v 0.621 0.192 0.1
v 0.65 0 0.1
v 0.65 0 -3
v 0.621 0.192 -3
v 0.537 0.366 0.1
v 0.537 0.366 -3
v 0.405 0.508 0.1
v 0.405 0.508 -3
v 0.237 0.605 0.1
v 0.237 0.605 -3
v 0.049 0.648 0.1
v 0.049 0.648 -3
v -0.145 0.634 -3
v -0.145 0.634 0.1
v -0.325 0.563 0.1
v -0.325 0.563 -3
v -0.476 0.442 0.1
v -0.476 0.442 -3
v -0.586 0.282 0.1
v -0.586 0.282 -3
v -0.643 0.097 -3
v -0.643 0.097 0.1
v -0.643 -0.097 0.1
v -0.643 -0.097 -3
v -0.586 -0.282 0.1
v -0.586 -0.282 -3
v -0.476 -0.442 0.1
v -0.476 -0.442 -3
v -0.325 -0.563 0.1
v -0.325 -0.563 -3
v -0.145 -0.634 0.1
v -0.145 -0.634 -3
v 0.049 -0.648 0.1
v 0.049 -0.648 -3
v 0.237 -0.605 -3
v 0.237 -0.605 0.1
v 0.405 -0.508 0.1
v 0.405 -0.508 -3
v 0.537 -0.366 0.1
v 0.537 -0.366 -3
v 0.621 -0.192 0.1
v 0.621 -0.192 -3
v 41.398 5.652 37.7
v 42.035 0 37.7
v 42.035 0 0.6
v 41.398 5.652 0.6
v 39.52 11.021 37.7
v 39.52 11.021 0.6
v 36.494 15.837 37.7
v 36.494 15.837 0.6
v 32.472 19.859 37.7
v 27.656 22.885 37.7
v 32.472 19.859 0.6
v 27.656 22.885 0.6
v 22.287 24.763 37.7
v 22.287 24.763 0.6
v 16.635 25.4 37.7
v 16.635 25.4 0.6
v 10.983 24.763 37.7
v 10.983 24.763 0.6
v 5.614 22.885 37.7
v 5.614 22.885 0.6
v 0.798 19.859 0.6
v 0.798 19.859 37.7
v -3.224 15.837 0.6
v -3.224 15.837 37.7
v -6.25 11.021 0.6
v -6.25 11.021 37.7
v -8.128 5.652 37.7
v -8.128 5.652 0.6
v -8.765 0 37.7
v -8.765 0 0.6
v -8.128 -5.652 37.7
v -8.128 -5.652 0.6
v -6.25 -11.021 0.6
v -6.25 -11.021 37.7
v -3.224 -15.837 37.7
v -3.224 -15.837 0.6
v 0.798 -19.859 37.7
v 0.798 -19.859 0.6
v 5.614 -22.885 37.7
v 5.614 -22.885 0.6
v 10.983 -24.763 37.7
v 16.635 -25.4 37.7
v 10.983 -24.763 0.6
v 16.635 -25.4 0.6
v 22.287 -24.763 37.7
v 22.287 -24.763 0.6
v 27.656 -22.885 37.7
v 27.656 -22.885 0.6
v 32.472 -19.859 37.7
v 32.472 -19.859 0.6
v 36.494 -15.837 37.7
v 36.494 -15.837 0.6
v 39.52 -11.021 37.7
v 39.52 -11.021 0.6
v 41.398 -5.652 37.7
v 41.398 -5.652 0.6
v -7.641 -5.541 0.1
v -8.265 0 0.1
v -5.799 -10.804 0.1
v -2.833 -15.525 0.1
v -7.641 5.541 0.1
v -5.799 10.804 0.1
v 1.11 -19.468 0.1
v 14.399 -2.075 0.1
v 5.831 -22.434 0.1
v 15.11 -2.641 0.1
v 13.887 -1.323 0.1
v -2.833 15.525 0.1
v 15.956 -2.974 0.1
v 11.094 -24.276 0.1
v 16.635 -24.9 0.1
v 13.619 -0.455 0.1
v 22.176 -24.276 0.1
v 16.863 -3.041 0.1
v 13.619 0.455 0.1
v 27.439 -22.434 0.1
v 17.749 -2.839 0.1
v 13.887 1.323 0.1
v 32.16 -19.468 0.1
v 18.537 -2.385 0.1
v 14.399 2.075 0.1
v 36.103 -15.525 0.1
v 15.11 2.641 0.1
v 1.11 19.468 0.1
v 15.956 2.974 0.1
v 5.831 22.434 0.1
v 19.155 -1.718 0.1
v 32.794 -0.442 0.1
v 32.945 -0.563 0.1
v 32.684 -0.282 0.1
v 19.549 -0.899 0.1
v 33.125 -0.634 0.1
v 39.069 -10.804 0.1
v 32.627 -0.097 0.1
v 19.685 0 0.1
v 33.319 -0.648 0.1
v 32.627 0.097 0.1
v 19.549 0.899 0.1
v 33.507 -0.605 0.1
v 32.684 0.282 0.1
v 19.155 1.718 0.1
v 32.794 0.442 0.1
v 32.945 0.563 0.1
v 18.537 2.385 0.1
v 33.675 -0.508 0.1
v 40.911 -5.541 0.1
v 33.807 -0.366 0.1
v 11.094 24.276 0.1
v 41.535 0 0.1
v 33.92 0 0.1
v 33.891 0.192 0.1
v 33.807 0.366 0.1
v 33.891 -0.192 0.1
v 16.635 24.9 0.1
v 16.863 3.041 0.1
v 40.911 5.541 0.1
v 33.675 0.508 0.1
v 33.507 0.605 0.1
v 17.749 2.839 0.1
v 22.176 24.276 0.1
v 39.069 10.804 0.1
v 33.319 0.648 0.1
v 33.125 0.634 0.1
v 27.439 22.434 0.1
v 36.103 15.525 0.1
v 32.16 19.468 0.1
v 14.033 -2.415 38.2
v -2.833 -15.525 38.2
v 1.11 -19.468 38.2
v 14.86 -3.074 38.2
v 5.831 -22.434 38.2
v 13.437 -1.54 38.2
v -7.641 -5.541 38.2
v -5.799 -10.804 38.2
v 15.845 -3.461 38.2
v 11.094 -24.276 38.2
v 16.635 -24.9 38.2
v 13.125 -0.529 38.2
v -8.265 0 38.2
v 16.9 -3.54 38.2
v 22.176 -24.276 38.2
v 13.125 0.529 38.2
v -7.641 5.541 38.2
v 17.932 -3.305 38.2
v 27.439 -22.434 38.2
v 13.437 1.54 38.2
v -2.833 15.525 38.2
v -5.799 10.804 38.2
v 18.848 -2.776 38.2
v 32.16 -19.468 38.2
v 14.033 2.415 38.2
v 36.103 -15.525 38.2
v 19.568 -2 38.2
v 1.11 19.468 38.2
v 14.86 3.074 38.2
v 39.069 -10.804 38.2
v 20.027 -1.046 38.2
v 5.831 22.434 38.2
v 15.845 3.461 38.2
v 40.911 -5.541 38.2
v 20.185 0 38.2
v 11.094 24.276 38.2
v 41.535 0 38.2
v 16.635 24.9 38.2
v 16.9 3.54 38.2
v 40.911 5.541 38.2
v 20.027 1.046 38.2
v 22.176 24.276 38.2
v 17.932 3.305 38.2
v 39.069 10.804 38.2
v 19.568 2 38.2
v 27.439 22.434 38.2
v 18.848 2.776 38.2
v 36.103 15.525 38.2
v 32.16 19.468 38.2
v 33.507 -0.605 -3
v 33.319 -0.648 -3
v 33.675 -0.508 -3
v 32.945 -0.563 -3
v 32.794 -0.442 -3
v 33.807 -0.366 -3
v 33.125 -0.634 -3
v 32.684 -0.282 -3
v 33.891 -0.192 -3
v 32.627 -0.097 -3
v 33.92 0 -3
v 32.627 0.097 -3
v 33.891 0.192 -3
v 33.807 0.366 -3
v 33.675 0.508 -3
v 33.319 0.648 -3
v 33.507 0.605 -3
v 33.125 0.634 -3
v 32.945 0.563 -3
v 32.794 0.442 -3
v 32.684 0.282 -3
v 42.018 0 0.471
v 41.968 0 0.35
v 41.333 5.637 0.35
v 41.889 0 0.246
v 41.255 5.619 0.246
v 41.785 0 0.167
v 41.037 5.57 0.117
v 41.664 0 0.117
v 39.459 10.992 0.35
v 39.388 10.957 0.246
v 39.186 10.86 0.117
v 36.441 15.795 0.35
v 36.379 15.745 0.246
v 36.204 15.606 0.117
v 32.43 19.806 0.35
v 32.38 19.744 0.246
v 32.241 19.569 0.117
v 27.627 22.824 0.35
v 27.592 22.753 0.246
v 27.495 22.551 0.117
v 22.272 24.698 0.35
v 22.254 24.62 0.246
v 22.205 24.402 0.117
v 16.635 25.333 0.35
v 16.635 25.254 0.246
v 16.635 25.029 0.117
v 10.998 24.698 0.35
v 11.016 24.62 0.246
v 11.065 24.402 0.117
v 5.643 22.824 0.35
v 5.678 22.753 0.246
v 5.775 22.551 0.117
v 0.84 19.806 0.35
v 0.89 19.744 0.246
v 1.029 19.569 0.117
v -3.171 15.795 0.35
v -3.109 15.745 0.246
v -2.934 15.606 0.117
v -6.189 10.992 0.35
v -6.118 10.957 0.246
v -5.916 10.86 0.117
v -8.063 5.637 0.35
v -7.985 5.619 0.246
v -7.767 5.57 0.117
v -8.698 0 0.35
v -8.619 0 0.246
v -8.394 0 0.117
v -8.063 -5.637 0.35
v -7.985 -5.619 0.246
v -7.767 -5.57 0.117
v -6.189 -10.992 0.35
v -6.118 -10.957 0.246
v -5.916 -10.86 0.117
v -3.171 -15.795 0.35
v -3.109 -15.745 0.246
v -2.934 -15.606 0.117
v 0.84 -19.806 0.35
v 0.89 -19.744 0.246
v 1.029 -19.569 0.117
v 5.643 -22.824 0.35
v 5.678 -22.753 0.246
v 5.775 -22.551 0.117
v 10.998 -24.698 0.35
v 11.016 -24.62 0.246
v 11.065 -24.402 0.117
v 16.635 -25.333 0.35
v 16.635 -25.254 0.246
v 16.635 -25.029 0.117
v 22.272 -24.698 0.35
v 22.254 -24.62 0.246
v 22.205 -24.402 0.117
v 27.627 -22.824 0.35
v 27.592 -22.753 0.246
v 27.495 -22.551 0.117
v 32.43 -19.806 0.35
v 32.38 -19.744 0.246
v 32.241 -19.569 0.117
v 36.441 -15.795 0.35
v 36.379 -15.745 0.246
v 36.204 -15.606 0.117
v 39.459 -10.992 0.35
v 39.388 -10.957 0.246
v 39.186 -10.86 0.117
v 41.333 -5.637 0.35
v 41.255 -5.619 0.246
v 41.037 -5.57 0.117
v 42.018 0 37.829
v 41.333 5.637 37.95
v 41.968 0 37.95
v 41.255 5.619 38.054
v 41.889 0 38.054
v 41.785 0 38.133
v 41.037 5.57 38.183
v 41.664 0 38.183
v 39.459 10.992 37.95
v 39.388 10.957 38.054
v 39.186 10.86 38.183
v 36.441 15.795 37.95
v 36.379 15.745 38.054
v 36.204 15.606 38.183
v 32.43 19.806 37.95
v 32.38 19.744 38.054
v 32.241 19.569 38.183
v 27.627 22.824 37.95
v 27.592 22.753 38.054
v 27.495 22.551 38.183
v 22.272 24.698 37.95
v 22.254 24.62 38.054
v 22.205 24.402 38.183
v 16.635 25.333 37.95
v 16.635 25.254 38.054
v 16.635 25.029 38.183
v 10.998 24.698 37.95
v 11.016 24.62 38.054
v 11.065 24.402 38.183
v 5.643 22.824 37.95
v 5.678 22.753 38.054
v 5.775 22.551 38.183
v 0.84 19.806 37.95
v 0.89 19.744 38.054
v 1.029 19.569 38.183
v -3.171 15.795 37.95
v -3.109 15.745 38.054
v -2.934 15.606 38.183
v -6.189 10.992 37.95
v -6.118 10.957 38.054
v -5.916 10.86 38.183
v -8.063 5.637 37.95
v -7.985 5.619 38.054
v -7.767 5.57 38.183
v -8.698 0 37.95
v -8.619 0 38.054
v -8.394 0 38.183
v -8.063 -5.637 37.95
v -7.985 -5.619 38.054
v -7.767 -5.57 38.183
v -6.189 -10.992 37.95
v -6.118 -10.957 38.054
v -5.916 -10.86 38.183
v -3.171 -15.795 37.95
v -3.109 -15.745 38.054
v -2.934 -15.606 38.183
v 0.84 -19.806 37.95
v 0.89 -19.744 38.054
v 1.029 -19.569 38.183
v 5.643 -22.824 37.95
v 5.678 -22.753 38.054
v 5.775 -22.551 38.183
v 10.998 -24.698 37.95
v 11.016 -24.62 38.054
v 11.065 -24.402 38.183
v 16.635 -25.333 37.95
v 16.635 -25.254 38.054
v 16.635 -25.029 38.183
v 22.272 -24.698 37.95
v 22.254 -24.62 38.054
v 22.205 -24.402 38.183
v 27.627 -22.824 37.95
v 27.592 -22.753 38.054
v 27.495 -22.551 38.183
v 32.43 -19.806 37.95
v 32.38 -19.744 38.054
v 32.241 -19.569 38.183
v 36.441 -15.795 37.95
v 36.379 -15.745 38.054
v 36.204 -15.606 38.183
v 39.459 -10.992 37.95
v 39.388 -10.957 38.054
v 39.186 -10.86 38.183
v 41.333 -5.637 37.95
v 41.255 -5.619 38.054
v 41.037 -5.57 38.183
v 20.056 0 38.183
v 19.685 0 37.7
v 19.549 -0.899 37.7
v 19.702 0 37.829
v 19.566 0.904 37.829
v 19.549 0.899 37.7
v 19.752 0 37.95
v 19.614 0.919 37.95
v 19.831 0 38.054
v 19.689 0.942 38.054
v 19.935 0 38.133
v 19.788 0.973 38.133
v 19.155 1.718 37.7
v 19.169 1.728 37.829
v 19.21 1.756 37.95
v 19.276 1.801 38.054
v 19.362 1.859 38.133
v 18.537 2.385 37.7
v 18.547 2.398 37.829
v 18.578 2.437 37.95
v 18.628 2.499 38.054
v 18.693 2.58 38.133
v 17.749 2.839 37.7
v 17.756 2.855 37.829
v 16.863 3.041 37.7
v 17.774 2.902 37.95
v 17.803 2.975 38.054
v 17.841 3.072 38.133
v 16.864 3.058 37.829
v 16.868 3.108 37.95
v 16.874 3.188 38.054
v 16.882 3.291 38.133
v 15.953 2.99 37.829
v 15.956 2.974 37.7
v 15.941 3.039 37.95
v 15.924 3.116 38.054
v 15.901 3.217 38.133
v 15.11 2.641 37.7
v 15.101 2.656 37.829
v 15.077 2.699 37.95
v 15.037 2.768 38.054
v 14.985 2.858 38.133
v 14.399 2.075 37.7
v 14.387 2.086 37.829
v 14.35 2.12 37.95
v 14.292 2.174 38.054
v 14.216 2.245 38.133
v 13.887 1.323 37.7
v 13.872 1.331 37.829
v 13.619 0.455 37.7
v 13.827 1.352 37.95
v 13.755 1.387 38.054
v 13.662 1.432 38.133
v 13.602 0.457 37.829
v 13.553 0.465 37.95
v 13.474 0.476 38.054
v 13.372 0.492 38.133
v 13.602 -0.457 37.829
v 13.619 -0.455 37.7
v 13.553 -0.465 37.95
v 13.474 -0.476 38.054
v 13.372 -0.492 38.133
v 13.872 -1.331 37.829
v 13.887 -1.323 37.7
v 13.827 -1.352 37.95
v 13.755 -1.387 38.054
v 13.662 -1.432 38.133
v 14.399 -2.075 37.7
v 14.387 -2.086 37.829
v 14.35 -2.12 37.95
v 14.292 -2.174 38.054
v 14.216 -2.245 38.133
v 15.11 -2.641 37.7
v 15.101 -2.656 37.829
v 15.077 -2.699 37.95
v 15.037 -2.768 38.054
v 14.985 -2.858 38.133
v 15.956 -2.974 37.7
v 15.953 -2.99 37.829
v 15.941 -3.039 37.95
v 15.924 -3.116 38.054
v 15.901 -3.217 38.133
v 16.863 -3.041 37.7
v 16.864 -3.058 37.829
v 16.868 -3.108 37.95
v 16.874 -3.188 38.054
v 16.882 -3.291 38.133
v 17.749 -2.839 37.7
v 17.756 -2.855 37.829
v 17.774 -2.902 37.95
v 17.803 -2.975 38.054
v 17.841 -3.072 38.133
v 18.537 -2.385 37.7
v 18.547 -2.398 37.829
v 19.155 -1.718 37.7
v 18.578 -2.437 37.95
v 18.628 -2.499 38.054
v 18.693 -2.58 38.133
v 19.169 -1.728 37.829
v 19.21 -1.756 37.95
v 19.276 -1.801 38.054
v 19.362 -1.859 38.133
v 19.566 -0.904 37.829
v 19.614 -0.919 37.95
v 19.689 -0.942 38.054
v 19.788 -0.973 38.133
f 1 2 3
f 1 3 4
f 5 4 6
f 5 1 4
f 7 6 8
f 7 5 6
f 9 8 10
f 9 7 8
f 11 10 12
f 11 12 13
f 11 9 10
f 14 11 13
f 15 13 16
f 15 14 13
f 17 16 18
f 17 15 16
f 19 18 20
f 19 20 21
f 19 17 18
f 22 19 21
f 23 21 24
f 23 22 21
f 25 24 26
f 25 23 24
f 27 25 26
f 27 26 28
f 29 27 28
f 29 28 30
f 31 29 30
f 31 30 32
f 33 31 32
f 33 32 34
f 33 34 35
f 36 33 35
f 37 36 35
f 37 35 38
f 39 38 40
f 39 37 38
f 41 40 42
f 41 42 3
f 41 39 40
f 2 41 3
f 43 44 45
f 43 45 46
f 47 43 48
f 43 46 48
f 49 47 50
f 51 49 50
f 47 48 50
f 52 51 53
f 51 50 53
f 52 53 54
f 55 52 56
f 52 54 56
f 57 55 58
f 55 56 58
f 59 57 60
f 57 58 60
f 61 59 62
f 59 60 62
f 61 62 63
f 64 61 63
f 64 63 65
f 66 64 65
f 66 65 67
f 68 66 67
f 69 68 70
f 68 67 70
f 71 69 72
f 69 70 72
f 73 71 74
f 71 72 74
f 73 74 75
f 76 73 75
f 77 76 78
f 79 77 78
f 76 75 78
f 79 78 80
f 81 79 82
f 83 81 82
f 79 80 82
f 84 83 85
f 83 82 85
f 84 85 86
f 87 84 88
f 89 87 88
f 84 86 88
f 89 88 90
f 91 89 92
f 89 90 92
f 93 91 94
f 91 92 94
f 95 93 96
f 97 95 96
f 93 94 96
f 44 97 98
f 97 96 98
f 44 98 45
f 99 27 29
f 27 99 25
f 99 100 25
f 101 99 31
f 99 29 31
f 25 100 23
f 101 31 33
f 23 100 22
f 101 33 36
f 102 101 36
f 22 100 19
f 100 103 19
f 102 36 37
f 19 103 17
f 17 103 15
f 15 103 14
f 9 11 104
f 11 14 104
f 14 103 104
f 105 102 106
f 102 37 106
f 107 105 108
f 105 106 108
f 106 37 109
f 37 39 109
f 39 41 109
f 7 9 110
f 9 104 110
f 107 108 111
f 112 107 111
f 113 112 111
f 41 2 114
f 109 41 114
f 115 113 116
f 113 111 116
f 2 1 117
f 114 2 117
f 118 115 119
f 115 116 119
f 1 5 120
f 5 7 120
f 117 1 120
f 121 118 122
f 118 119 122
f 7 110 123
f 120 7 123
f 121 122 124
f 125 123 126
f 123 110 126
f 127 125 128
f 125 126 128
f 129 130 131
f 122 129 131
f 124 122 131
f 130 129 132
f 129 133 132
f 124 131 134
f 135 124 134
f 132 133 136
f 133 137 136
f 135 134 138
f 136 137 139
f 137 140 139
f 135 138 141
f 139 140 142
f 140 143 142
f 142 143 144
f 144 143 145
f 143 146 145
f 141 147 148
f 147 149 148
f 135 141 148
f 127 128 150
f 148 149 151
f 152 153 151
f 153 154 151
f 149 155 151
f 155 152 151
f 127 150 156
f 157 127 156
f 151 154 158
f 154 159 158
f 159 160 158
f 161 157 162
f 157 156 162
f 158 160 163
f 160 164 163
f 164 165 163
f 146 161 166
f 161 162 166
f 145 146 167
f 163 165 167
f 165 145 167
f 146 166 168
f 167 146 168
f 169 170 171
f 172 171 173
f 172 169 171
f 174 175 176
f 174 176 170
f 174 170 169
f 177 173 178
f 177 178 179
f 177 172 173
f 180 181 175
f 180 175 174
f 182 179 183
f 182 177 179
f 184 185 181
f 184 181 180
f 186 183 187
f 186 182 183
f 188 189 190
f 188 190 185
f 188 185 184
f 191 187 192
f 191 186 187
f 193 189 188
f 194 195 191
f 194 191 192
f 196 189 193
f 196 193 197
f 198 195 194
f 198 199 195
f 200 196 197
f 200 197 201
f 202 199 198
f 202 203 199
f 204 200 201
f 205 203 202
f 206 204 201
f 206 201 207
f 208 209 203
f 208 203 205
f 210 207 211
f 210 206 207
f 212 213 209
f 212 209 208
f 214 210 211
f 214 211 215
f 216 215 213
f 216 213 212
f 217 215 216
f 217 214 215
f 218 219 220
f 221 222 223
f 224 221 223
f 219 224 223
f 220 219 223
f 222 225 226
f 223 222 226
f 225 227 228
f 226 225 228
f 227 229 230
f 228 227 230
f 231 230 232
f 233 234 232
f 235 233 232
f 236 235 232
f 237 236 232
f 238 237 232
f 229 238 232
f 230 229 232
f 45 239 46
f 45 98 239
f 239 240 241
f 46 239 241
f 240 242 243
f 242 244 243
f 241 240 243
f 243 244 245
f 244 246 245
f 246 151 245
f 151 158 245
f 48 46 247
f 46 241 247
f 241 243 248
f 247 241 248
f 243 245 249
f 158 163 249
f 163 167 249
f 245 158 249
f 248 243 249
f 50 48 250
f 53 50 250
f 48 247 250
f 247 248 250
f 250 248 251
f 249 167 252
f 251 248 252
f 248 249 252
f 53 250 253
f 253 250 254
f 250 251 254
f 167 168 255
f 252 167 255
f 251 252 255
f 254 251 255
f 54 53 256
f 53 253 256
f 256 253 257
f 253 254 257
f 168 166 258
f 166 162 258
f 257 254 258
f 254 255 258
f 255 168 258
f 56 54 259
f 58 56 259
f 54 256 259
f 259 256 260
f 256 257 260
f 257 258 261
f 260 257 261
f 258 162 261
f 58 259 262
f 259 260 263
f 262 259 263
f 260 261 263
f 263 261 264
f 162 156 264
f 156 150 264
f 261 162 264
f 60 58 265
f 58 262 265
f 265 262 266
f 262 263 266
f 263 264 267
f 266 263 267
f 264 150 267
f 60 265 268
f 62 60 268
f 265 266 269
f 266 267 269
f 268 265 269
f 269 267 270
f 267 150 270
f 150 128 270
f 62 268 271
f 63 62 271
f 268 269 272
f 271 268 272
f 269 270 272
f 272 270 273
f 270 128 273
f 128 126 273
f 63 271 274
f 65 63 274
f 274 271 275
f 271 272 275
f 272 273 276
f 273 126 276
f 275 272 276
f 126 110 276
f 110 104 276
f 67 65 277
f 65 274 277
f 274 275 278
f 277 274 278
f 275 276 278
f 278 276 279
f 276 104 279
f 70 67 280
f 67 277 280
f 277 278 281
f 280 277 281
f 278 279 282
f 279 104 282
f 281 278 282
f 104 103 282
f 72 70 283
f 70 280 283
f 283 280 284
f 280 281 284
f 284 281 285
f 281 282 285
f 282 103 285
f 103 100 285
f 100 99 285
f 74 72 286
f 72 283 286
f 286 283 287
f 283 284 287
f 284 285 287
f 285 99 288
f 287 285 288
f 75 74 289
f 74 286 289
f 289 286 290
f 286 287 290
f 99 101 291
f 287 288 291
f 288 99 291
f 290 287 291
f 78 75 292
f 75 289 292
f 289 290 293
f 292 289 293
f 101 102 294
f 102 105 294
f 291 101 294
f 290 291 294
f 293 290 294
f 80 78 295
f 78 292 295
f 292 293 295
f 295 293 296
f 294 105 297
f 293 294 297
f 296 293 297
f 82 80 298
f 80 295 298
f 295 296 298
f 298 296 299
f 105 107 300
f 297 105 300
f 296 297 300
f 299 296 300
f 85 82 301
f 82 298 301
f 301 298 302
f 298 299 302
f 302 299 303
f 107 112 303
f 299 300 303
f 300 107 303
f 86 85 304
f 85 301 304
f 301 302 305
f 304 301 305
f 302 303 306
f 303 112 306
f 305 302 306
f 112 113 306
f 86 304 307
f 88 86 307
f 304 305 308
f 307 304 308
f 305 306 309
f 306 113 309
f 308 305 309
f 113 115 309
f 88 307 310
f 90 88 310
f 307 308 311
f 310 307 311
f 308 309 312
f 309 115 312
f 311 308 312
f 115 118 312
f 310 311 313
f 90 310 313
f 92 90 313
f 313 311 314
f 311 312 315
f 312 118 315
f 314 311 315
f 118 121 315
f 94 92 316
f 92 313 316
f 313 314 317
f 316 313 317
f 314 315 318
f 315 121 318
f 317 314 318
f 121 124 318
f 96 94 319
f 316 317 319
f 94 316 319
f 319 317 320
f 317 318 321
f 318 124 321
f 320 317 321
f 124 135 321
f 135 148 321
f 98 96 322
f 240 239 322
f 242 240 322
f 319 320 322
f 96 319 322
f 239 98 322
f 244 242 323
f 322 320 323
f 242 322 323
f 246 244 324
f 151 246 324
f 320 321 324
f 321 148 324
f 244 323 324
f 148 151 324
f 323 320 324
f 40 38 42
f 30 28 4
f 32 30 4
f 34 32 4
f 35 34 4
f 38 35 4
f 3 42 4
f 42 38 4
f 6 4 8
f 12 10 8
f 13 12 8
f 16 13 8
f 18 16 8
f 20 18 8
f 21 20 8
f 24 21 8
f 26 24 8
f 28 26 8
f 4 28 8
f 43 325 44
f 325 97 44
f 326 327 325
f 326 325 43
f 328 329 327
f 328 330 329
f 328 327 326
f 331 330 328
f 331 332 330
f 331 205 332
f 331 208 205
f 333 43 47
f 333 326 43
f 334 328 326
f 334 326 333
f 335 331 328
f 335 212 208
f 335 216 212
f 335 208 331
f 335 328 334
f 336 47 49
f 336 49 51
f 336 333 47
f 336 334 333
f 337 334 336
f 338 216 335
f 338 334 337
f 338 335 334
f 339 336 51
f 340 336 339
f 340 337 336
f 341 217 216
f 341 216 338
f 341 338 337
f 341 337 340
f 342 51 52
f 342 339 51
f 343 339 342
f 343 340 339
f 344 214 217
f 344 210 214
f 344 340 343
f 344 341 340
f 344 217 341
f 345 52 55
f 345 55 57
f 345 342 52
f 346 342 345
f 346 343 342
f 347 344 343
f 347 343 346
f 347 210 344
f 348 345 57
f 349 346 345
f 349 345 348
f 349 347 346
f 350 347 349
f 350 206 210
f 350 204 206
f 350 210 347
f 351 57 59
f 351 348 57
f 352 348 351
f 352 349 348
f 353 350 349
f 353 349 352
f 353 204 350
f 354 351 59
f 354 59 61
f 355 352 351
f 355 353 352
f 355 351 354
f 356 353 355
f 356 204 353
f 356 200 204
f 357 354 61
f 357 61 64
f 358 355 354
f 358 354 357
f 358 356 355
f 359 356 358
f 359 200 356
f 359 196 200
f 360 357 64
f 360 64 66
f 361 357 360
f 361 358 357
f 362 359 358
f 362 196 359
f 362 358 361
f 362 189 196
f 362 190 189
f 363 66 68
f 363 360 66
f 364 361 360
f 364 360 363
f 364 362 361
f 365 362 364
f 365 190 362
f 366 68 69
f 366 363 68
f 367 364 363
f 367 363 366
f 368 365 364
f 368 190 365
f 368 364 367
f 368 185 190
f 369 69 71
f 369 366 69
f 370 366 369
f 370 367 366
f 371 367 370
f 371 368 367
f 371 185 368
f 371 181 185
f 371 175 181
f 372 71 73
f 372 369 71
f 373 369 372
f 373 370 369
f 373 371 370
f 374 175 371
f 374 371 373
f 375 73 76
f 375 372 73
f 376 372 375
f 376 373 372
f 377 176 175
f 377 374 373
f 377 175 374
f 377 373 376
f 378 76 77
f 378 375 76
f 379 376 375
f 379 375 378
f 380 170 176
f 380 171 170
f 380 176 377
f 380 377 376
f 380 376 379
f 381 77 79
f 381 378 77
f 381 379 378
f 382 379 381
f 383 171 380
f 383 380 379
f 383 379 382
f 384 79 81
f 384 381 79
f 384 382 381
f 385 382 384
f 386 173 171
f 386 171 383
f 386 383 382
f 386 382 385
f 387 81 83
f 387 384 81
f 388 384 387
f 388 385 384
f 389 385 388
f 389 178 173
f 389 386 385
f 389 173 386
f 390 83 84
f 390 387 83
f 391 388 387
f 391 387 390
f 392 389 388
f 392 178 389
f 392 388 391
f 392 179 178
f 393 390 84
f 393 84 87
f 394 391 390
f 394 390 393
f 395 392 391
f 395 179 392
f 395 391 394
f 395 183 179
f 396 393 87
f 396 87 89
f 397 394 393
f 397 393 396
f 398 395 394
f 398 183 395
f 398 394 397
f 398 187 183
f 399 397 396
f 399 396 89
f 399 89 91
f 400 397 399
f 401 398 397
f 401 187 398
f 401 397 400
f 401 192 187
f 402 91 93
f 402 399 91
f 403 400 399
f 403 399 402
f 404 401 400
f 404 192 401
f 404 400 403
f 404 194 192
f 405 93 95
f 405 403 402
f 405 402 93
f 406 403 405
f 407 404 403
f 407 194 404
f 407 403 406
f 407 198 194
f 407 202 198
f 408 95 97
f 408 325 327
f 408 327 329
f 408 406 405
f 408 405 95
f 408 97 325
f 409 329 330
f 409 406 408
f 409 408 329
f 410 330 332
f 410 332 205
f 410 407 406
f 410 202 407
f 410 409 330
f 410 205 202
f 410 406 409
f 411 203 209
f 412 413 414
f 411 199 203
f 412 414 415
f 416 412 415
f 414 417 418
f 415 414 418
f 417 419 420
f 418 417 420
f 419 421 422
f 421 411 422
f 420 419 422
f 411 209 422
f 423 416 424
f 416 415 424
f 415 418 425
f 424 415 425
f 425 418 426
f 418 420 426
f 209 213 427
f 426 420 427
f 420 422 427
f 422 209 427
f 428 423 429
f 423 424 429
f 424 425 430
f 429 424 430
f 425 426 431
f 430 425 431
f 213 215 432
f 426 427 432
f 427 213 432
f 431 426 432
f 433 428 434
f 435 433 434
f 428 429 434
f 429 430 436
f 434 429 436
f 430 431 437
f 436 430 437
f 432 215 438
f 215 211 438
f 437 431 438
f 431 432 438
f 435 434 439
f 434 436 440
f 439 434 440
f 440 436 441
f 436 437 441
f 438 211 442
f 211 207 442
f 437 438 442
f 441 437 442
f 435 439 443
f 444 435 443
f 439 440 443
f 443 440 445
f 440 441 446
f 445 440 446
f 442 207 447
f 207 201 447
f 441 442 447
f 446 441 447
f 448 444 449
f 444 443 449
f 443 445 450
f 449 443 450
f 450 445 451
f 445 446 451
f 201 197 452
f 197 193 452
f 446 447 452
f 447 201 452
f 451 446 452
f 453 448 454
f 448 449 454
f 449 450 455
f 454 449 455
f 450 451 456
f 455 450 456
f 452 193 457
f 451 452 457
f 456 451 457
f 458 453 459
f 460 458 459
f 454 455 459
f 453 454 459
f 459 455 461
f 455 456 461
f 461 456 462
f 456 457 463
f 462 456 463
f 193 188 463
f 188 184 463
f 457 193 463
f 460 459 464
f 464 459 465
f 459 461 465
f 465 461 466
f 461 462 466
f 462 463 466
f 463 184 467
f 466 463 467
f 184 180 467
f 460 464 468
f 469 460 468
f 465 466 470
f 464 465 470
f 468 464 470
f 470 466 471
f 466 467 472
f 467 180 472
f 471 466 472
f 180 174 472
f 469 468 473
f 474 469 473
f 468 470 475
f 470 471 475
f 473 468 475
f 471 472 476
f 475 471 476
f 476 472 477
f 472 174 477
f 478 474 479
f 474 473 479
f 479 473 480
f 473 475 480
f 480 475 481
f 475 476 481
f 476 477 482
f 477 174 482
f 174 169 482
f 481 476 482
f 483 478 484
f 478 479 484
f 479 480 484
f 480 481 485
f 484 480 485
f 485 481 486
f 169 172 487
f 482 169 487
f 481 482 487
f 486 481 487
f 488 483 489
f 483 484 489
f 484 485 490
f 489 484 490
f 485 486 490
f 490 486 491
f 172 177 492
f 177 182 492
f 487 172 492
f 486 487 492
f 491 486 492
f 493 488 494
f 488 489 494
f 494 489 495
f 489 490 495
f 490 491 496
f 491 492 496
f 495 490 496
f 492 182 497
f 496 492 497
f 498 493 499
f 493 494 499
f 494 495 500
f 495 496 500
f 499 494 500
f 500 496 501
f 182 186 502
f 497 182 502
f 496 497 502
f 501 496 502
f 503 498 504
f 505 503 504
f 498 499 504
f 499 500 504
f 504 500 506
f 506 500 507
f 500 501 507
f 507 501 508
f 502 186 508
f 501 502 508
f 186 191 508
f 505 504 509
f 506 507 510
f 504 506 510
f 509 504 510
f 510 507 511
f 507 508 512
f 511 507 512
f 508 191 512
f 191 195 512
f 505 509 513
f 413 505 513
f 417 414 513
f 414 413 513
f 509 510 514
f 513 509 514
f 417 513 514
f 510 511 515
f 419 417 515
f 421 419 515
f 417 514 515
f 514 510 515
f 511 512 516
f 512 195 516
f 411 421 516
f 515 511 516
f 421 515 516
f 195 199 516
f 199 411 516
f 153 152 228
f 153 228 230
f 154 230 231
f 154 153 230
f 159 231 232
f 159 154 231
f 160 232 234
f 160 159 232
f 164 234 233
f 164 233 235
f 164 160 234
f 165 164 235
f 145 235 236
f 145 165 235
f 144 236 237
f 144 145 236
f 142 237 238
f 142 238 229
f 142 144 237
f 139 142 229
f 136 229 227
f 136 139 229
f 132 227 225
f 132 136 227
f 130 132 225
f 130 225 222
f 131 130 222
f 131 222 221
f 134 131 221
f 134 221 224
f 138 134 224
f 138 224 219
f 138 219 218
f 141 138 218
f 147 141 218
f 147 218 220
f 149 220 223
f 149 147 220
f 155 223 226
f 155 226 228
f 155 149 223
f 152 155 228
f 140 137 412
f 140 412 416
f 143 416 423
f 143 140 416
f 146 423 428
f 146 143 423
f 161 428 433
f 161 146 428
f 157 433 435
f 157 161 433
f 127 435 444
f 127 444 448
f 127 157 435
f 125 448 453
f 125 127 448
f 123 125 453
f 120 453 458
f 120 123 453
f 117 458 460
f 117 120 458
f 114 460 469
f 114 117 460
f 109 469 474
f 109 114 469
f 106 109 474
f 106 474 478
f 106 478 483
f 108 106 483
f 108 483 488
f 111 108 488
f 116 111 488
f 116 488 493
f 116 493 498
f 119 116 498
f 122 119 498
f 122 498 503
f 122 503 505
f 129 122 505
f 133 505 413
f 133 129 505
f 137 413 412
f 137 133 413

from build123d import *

# Parameters (mm, degrees)
SKETCH001_R       = 0.65
PAD001_DEPTH      = 19.05
PAD001_DEPTH_BACK = 3.5
SKETCH_R          = 25.4
SKETCH_R_2        = 3.05
PAD_DEPTH         = 38.1
FILLET_R          = 0.5


with BuildPart() as pad001:
    # Sketch001 → Pad001 (new body, two sides)
    with BuildSketch(Plane.XY.offset(0.5)) as pad001_sk:
        Circle(SKETCH001_R)
        with Locations((33.27, 0)):
            Circle(SKETCH001_R)
    extrude(amount=PAD001_DEPTH)
    extrude(pad001_sk.sketch, amount=-PAD001_DEPTH_BACK)


with BuildPart() as fillet_mp_cp:
    # Sketch → Pad (new body)
    with BuildSketch(Plane.XY.offset(0.1)):
        with Locations((16.635, 0)):
            Circle(SKETCH_R)
        with Locations((16.635, 0)):
            Circle(SKETCH_R_2, mode=Mode.SUBTRACT)
    extrude(amount=PAD_DEPTH)

    # Fillet
    fillet_edges = [fillet_mp_cp.edges().sort_by_distance(p)[0] for p in [
        (13.585, 0, 38.2),
        (-8.765, 0, 38.2),
        (-8.765, 0, 0.1),
    ]]
    fillet(fillet_edges, radius=FILLET_R)

    # Fillet_mp_cp: union Pad001
    add(pad001.part)


solid = fillet_mp_cp.part
